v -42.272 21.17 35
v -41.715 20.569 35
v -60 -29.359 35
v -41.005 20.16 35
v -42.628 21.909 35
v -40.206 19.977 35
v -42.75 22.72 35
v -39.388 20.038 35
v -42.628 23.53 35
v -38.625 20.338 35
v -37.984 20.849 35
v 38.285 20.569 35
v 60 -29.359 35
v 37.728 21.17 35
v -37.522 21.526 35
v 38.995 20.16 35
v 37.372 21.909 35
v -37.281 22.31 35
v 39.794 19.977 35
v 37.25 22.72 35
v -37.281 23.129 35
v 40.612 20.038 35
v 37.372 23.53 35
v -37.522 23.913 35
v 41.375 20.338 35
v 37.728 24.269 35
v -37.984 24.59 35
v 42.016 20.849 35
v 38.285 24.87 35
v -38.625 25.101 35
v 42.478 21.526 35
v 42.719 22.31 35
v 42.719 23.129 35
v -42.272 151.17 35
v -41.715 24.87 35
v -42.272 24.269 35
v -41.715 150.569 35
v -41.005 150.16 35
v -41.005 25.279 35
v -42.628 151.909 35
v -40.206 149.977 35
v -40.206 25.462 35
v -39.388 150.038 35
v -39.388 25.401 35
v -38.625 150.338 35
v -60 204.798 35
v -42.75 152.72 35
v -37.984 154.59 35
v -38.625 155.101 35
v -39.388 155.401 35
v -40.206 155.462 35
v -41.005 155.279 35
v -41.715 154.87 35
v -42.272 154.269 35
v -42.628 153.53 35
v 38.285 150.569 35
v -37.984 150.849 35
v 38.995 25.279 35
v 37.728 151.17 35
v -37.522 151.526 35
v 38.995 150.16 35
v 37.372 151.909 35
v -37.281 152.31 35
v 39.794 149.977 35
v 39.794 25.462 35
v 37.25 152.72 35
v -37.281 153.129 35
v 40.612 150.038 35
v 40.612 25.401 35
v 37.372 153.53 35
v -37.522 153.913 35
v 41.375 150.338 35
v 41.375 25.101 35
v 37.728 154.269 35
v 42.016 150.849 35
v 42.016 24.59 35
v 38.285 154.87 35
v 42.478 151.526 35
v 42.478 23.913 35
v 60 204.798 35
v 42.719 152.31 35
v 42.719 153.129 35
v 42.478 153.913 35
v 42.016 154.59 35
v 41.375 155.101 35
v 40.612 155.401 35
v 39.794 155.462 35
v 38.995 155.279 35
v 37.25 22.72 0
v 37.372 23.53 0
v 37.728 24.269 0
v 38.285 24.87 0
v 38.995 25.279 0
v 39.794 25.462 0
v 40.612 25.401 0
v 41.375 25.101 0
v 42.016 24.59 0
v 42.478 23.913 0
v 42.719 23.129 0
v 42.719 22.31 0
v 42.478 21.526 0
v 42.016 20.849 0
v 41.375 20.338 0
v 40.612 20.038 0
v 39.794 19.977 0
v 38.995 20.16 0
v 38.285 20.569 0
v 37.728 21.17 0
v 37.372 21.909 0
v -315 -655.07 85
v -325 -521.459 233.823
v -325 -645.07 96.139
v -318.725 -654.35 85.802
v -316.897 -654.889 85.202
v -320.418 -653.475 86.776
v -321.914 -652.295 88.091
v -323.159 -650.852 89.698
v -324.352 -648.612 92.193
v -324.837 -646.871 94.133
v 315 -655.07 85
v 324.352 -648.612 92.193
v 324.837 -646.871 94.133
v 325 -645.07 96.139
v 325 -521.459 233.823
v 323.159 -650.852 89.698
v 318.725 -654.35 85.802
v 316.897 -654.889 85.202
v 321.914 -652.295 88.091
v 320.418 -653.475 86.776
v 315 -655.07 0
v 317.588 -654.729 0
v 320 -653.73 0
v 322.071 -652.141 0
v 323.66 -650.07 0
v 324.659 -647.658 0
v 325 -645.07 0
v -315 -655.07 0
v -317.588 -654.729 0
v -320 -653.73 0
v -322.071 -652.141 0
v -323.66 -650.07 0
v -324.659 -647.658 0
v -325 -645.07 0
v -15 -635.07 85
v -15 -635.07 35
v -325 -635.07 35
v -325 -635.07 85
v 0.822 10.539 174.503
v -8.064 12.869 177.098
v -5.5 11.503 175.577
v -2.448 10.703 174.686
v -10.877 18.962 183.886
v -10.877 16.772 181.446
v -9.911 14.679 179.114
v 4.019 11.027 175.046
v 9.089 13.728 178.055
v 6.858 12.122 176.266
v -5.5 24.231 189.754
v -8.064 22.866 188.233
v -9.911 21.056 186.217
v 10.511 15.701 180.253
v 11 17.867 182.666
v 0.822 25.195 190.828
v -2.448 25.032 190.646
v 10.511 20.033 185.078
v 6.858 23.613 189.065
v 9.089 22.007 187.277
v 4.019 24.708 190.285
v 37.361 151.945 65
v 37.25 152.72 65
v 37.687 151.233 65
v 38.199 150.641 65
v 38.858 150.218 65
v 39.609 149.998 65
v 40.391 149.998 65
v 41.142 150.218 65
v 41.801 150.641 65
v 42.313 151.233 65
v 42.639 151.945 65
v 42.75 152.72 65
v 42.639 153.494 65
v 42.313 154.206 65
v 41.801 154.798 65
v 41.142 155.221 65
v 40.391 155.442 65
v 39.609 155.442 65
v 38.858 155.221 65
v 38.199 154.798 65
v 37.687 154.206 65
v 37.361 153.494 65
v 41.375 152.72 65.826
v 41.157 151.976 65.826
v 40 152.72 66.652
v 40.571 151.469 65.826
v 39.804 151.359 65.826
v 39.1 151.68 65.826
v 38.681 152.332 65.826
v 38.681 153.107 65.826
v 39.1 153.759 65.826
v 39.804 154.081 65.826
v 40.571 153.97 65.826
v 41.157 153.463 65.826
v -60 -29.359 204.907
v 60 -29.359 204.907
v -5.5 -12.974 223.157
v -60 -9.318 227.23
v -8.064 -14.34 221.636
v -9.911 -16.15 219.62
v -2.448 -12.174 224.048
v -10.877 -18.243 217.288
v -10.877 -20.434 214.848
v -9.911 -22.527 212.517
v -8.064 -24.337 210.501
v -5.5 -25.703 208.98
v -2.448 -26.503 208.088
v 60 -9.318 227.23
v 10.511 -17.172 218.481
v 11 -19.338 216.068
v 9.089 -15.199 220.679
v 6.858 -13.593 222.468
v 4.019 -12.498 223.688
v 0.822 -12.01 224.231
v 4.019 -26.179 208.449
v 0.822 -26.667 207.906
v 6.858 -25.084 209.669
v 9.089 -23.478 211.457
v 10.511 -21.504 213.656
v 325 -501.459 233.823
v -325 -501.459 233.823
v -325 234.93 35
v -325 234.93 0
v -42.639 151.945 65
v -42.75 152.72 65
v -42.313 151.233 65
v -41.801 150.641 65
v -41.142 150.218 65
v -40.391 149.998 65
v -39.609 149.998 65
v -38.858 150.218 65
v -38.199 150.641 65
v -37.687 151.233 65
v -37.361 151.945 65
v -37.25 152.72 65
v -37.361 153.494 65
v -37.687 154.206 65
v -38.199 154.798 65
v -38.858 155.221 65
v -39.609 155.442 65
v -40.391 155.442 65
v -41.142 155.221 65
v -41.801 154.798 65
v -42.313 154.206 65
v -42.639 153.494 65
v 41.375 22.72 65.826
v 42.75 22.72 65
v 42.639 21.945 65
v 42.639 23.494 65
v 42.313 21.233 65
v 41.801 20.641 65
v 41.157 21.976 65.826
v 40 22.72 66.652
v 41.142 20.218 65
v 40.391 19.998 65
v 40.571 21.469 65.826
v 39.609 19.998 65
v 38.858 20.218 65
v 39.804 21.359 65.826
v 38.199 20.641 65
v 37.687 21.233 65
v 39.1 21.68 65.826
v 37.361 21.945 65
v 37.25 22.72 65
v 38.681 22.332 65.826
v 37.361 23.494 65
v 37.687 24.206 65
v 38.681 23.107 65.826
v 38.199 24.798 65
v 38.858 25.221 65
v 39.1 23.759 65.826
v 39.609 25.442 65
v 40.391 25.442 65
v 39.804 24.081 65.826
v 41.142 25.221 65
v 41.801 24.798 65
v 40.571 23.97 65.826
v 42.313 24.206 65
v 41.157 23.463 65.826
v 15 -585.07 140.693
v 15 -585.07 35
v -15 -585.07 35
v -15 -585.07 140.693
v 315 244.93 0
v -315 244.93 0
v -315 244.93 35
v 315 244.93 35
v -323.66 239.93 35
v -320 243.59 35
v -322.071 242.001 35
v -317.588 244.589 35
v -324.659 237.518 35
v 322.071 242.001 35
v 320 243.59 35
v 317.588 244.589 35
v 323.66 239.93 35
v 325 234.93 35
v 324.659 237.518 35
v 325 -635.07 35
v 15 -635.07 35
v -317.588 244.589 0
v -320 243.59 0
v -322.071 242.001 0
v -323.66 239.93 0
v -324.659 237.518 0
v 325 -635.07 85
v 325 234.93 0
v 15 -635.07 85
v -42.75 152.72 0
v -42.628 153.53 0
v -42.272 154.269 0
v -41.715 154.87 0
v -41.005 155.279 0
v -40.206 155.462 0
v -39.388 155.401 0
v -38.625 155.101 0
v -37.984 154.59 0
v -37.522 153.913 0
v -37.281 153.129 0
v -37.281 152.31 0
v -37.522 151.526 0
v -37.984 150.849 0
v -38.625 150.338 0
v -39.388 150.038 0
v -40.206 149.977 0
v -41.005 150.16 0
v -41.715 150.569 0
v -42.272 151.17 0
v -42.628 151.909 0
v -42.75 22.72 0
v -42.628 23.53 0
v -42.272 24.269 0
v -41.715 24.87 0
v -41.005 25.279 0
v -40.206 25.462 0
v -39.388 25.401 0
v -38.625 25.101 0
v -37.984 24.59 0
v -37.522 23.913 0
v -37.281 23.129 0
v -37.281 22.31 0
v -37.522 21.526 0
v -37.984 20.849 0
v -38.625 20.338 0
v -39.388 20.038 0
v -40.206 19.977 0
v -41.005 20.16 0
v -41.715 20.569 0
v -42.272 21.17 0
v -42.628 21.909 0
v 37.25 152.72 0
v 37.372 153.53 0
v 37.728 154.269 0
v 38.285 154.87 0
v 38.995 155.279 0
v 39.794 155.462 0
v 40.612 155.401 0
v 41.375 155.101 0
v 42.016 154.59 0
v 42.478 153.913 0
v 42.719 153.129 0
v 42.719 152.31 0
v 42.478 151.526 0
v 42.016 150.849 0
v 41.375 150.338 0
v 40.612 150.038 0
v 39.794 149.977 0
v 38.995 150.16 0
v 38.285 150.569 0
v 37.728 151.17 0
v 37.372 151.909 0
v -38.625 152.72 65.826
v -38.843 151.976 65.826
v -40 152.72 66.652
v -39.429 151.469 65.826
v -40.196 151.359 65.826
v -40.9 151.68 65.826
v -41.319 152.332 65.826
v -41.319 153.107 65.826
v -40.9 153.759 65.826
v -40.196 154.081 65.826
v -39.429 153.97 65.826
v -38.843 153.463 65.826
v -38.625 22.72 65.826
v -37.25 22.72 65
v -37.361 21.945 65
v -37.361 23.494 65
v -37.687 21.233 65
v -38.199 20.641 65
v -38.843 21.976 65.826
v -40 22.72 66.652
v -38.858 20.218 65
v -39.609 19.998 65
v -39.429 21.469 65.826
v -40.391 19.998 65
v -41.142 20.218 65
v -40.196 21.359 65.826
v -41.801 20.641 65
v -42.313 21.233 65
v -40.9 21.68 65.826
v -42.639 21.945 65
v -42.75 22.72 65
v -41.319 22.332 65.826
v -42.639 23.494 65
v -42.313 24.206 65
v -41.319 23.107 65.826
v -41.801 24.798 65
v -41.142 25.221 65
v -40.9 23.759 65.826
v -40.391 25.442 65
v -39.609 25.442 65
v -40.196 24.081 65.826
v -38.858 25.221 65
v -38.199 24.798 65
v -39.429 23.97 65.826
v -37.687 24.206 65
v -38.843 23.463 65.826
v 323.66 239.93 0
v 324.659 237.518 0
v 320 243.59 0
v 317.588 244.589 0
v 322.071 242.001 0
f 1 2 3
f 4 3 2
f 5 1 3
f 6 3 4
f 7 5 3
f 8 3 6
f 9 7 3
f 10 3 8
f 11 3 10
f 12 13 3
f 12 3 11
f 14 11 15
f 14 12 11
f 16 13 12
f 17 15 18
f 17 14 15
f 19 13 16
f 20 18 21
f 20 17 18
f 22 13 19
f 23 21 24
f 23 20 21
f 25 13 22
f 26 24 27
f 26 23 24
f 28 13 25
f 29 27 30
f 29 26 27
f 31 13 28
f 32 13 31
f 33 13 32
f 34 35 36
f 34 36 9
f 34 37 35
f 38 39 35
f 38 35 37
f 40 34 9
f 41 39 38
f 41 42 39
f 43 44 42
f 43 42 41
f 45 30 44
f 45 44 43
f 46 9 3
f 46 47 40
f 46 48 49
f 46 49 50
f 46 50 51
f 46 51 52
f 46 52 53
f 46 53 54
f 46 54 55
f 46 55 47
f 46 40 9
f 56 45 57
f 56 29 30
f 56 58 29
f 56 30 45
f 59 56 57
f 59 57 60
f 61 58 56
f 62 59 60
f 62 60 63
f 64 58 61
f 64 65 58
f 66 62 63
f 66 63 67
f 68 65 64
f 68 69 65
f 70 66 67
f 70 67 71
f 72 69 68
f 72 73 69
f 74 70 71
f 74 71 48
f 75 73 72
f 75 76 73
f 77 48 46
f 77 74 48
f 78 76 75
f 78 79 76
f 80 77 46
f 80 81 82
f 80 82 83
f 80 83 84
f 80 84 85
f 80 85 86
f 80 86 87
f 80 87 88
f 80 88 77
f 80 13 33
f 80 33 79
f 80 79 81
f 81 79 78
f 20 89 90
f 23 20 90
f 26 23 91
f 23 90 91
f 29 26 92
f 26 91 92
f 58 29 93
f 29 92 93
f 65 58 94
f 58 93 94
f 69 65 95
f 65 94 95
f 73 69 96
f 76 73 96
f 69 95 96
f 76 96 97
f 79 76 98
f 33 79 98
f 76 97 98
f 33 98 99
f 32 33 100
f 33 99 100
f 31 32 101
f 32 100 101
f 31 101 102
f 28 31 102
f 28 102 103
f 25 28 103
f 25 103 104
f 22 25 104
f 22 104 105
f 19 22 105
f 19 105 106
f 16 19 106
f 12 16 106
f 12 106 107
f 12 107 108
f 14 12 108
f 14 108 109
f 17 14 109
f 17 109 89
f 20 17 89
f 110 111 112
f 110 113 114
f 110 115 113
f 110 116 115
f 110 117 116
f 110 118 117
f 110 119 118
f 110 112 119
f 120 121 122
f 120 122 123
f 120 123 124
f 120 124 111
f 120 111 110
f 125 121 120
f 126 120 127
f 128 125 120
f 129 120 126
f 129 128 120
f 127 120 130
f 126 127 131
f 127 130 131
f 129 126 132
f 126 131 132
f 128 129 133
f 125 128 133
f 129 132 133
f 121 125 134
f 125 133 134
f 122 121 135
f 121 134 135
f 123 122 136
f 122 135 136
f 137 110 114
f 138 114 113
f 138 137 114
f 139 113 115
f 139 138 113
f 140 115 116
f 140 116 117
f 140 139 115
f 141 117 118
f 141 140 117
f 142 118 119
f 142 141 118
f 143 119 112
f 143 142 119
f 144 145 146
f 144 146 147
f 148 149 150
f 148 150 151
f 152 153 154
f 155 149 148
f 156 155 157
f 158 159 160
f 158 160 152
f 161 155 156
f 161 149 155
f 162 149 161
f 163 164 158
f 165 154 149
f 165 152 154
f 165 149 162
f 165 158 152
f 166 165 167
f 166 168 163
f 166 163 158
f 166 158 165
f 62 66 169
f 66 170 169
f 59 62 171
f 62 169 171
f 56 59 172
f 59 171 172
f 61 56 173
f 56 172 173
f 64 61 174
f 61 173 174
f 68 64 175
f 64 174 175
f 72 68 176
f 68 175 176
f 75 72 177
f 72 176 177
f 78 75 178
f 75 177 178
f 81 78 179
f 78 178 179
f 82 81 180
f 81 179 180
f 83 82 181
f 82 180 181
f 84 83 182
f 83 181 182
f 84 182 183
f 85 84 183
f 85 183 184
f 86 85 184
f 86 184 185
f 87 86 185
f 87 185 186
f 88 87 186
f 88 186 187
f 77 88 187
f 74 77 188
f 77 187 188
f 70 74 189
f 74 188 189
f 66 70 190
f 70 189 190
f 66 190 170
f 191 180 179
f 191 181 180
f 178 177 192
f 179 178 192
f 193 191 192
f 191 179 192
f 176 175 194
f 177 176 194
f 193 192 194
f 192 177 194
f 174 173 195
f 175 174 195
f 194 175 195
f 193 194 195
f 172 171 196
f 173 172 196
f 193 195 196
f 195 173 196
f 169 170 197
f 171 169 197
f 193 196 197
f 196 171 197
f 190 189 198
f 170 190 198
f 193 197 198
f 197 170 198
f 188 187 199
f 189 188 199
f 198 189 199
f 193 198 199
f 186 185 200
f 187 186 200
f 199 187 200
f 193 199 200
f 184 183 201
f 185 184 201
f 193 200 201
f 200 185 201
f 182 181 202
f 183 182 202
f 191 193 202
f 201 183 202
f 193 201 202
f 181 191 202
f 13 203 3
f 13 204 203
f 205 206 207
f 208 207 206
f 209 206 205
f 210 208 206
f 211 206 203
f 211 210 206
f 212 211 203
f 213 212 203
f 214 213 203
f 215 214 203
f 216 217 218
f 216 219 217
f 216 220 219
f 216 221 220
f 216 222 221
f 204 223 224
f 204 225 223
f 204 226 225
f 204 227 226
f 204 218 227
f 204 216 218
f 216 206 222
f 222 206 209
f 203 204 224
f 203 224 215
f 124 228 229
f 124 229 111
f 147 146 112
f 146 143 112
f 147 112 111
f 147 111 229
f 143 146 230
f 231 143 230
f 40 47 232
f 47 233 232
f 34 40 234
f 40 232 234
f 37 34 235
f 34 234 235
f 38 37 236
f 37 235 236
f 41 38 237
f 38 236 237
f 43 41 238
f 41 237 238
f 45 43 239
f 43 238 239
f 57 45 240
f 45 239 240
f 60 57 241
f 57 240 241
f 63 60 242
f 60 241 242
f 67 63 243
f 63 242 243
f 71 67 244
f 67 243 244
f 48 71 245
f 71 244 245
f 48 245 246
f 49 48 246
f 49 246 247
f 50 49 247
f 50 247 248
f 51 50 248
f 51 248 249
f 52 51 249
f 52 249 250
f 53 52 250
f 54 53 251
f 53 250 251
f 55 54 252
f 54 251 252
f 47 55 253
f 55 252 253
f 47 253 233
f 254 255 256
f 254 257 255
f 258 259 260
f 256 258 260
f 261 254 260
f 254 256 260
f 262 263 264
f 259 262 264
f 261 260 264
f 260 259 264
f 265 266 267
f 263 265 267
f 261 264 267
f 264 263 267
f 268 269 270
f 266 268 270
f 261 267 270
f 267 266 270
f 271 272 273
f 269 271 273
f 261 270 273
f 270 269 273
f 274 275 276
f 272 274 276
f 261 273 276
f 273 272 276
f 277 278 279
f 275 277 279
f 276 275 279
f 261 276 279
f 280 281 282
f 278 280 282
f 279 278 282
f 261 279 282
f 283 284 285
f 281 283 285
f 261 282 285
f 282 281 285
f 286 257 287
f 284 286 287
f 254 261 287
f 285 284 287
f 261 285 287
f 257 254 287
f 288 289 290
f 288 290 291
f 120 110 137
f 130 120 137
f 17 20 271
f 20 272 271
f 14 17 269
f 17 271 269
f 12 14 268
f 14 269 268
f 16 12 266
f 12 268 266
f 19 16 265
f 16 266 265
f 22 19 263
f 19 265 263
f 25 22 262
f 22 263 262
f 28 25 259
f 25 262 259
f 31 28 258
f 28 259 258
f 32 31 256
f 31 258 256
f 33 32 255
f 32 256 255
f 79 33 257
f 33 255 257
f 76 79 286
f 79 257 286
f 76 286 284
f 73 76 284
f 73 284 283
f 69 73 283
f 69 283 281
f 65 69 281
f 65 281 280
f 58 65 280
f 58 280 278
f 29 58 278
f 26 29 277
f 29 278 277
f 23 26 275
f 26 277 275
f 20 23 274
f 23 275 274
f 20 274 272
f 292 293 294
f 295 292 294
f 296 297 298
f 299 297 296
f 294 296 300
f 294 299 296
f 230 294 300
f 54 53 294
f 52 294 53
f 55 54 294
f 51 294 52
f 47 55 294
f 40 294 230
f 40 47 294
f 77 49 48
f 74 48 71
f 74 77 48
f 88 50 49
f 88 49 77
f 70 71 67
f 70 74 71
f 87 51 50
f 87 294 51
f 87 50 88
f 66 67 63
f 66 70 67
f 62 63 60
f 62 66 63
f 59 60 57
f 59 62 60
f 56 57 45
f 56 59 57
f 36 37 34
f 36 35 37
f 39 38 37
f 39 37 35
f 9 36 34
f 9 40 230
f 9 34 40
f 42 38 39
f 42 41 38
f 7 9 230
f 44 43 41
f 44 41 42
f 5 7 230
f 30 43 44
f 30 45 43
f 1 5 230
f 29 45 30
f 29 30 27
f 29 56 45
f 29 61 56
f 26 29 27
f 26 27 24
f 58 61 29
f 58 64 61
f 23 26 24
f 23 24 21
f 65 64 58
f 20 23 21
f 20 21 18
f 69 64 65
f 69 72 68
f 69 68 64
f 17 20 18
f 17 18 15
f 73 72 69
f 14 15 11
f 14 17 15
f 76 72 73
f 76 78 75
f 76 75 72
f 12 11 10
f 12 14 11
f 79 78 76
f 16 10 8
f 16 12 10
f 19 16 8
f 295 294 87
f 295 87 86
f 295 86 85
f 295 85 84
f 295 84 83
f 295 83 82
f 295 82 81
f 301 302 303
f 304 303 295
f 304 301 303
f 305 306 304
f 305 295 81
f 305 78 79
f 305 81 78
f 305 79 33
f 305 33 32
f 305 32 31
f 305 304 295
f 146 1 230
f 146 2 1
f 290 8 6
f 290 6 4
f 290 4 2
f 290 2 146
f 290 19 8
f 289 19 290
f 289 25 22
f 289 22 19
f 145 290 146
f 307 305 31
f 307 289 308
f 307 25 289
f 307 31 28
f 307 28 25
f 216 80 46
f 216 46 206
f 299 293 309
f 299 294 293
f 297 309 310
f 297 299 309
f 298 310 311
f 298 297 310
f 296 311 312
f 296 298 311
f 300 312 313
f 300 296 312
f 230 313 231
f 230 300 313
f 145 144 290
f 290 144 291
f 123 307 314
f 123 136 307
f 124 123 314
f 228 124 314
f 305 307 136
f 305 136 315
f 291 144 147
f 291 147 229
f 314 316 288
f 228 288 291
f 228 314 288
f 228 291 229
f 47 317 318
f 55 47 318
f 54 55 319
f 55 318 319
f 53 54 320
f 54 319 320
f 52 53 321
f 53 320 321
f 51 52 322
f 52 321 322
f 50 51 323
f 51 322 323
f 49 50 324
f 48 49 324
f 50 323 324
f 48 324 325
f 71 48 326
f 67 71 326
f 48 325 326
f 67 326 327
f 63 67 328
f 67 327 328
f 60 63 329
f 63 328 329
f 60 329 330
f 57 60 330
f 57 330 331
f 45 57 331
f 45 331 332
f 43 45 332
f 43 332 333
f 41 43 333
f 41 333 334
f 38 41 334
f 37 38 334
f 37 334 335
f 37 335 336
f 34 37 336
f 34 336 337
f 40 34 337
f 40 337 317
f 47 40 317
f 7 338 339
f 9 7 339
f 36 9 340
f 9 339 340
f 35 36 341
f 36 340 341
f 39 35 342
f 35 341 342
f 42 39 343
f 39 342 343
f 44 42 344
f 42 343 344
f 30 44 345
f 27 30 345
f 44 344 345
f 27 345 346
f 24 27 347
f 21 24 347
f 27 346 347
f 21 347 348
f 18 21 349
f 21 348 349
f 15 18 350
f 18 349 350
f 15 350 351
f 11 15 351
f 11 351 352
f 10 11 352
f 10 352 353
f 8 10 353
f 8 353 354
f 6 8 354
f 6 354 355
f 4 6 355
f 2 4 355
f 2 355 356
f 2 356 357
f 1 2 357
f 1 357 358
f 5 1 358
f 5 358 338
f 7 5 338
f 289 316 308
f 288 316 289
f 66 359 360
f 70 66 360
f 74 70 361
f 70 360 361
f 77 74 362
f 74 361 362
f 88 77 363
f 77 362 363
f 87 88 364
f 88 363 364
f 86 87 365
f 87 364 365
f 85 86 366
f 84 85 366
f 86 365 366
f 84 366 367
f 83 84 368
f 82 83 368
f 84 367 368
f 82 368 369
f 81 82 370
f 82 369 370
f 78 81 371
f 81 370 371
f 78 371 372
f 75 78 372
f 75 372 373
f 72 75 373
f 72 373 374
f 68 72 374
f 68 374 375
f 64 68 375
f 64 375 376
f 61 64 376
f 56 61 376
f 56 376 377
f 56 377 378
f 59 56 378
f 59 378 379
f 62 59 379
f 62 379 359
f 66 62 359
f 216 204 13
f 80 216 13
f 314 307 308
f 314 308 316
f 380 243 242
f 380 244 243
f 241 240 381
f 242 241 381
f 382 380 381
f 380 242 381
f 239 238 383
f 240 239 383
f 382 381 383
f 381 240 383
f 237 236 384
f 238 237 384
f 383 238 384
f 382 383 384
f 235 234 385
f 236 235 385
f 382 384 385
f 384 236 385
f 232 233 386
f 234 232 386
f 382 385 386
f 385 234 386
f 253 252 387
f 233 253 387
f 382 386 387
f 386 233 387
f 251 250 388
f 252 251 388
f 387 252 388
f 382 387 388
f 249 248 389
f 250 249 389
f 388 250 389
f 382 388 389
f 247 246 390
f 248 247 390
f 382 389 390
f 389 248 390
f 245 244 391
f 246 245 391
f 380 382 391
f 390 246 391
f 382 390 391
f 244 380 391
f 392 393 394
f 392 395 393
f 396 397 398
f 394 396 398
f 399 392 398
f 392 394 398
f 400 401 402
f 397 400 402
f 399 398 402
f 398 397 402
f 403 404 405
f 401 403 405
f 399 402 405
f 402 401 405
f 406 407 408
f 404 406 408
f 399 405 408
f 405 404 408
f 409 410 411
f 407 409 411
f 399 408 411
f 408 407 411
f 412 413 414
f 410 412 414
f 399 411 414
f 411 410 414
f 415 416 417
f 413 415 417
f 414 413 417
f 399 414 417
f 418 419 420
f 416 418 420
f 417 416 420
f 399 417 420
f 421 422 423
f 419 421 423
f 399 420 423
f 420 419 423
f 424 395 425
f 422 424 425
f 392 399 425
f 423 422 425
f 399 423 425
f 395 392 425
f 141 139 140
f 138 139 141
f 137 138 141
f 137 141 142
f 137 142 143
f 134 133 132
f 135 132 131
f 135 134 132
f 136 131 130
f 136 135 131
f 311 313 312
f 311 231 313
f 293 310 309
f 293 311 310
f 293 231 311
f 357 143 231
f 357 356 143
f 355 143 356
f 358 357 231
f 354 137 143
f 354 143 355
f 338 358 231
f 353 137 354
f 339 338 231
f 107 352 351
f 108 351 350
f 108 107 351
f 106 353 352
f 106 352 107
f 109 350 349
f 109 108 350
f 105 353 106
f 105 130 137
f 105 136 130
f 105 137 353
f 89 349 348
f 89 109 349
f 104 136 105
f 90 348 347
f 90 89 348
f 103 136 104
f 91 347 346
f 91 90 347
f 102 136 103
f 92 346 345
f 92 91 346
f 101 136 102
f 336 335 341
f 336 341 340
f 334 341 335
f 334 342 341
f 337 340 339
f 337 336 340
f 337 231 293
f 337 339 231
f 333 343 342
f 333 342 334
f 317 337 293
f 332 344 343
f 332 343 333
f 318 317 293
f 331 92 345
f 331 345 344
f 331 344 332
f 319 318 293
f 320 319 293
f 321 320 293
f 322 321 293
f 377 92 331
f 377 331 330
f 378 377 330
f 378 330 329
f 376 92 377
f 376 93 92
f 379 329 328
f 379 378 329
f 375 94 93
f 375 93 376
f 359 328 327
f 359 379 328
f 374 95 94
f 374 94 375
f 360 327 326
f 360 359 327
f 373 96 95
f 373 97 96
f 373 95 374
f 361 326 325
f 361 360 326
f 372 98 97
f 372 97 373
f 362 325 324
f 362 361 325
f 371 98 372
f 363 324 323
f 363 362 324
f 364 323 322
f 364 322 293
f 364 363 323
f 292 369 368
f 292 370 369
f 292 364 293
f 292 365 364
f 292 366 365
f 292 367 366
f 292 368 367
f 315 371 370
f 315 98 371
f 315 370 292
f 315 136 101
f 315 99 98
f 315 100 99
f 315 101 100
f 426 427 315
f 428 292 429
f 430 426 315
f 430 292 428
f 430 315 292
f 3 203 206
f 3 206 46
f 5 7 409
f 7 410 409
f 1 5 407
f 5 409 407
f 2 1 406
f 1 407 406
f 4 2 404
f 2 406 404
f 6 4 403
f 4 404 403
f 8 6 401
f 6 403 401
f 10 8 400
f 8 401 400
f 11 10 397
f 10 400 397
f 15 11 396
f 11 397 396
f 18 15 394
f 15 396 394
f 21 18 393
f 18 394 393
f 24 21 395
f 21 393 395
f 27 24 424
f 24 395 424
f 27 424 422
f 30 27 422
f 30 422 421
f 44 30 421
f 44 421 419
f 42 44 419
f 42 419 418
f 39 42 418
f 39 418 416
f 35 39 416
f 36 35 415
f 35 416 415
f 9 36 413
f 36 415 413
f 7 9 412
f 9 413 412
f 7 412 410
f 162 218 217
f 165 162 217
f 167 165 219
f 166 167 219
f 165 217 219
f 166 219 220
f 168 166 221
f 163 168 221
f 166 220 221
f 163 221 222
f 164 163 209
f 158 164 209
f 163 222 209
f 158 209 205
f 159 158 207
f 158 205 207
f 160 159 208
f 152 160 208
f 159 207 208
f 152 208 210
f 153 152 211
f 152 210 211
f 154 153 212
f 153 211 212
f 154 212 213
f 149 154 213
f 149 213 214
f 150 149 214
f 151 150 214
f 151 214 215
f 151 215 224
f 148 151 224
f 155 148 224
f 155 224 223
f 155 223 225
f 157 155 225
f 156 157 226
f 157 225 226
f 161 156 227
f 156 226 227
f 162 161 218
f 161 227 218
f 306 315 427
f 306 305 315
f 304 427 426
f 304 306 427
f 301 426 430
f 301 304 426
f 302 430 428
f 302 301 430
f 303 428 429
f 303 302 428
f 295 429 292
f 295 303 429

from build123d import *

# Parameters (mm, degrees)
F3_W      = 20
F3_H      = 50
F4_DEPTH  = 325
F5_R      = 10
F6_DEPTH  = 15
F7_DEPTH  = 60
F8_R      = 11
F9_DEPTH  = 50
F11_D     = 5.5
F11_DEPTH = 30
F11_TIP   = 1.6523667023
F12_D     = 5.5


with BuildPart() as f4:
    # F3 (on Right) → F4 (new body, symmetric)
    with BuildSketch(Plane.YZ):
        Polygon((-655.070145556, 35), (-655.070145556, 0), (244.929854444, 0), (244.929854444, 35), (204.7982960939, 35), (-29.3592664599, 35), (-585.070145556, 35), (-635.070145556, 35), align=None)
        with Locations((-645.070145556, 60)):
            Rectangle(F3_W, F3_H)
        Polygon((-521.4594720054, 233.8226727127), (-655.070145556, 85), (-635.070145556, 85), (-585.070145556, 140.6926586619), (-501.4594720054, 233.8226727127), align=None)
    extrude(amount=F4_DEPTH, both=True)

    # F5
    f5_edges = [f4.edges().sort_by_distance(p)[0] for p in [
        (325, -655.070146, 42.5),
        (325, 244.929854, 17.5),
        (-325, -655.070146, 42.5),
        (-325, 244.929854, 17.5),
    ]]
    fillet(f5_edges, radius=F5_R)

    # F3 (on Right) → F6 (join, symmetric)
    with BuildSketch(Plane.YZ):
        Polygon((-635.070145556, 85), (-635.070145556, 35), (-585.070145556, 35), (-585.070145556, 140.6926586619), align=None)
    extrude(amount=F6_DEPTH, both=True)

    # F12 (through all)
    with Locations(Plane.XY.offset(35)):
        with Locations((40, 22.719514817), (-40, 22.719514817), (-40, 152.719514817), (40, 152.719514817)):
            Hole(F12_D / 2)


with BuildPart() as f7:
    # F3 (on Right) → F7 (new body, symmetric)
    with BuildSketch(Plane.YZ):
        Polygon((-29.3592664599, 35), (204.7982960939, 35), (-9.3176654273, 227.2299695021), (-29.3592664599, 204.9065685952), align=None)
    extrude(amount=F7_DEPTH, both=True)

    # F8 (on face) → F9 (cut)
    with BuildSketch(Plane(origin=(0, -118.1169432138, 106.0435486937), x_dir=(1, 0, 0), z_dir=(0, -0.7441133636, 0.6680533678))):
        with Locations((0, 147.8601591404)):
            Circle(F8_R)
    extrude(amount=-F9_DEPTH, mode=Mode.SUBTRACT)

    # F11
    with Locations(Plane(origin=(0, 0, 35), x_dir=(1, 0, 0), z_dir=(0, 0, -1))):
        with Locations((-40, -22.719514817), (40, -22.719514817), (40, -152.719514817), (-40, -152.719514817)):
            Hole(F11_D / 2, depth=F11_DEPTH)
            with Locations((0, 0, -(F11_DEPTH + F11_TIP / 2))):  # 118° drill point
                Cone(0, F11_D / 2, F11_TIP, mode=Mode.SUBTRACT)


solid = Compound([f4.part, f7.part])
